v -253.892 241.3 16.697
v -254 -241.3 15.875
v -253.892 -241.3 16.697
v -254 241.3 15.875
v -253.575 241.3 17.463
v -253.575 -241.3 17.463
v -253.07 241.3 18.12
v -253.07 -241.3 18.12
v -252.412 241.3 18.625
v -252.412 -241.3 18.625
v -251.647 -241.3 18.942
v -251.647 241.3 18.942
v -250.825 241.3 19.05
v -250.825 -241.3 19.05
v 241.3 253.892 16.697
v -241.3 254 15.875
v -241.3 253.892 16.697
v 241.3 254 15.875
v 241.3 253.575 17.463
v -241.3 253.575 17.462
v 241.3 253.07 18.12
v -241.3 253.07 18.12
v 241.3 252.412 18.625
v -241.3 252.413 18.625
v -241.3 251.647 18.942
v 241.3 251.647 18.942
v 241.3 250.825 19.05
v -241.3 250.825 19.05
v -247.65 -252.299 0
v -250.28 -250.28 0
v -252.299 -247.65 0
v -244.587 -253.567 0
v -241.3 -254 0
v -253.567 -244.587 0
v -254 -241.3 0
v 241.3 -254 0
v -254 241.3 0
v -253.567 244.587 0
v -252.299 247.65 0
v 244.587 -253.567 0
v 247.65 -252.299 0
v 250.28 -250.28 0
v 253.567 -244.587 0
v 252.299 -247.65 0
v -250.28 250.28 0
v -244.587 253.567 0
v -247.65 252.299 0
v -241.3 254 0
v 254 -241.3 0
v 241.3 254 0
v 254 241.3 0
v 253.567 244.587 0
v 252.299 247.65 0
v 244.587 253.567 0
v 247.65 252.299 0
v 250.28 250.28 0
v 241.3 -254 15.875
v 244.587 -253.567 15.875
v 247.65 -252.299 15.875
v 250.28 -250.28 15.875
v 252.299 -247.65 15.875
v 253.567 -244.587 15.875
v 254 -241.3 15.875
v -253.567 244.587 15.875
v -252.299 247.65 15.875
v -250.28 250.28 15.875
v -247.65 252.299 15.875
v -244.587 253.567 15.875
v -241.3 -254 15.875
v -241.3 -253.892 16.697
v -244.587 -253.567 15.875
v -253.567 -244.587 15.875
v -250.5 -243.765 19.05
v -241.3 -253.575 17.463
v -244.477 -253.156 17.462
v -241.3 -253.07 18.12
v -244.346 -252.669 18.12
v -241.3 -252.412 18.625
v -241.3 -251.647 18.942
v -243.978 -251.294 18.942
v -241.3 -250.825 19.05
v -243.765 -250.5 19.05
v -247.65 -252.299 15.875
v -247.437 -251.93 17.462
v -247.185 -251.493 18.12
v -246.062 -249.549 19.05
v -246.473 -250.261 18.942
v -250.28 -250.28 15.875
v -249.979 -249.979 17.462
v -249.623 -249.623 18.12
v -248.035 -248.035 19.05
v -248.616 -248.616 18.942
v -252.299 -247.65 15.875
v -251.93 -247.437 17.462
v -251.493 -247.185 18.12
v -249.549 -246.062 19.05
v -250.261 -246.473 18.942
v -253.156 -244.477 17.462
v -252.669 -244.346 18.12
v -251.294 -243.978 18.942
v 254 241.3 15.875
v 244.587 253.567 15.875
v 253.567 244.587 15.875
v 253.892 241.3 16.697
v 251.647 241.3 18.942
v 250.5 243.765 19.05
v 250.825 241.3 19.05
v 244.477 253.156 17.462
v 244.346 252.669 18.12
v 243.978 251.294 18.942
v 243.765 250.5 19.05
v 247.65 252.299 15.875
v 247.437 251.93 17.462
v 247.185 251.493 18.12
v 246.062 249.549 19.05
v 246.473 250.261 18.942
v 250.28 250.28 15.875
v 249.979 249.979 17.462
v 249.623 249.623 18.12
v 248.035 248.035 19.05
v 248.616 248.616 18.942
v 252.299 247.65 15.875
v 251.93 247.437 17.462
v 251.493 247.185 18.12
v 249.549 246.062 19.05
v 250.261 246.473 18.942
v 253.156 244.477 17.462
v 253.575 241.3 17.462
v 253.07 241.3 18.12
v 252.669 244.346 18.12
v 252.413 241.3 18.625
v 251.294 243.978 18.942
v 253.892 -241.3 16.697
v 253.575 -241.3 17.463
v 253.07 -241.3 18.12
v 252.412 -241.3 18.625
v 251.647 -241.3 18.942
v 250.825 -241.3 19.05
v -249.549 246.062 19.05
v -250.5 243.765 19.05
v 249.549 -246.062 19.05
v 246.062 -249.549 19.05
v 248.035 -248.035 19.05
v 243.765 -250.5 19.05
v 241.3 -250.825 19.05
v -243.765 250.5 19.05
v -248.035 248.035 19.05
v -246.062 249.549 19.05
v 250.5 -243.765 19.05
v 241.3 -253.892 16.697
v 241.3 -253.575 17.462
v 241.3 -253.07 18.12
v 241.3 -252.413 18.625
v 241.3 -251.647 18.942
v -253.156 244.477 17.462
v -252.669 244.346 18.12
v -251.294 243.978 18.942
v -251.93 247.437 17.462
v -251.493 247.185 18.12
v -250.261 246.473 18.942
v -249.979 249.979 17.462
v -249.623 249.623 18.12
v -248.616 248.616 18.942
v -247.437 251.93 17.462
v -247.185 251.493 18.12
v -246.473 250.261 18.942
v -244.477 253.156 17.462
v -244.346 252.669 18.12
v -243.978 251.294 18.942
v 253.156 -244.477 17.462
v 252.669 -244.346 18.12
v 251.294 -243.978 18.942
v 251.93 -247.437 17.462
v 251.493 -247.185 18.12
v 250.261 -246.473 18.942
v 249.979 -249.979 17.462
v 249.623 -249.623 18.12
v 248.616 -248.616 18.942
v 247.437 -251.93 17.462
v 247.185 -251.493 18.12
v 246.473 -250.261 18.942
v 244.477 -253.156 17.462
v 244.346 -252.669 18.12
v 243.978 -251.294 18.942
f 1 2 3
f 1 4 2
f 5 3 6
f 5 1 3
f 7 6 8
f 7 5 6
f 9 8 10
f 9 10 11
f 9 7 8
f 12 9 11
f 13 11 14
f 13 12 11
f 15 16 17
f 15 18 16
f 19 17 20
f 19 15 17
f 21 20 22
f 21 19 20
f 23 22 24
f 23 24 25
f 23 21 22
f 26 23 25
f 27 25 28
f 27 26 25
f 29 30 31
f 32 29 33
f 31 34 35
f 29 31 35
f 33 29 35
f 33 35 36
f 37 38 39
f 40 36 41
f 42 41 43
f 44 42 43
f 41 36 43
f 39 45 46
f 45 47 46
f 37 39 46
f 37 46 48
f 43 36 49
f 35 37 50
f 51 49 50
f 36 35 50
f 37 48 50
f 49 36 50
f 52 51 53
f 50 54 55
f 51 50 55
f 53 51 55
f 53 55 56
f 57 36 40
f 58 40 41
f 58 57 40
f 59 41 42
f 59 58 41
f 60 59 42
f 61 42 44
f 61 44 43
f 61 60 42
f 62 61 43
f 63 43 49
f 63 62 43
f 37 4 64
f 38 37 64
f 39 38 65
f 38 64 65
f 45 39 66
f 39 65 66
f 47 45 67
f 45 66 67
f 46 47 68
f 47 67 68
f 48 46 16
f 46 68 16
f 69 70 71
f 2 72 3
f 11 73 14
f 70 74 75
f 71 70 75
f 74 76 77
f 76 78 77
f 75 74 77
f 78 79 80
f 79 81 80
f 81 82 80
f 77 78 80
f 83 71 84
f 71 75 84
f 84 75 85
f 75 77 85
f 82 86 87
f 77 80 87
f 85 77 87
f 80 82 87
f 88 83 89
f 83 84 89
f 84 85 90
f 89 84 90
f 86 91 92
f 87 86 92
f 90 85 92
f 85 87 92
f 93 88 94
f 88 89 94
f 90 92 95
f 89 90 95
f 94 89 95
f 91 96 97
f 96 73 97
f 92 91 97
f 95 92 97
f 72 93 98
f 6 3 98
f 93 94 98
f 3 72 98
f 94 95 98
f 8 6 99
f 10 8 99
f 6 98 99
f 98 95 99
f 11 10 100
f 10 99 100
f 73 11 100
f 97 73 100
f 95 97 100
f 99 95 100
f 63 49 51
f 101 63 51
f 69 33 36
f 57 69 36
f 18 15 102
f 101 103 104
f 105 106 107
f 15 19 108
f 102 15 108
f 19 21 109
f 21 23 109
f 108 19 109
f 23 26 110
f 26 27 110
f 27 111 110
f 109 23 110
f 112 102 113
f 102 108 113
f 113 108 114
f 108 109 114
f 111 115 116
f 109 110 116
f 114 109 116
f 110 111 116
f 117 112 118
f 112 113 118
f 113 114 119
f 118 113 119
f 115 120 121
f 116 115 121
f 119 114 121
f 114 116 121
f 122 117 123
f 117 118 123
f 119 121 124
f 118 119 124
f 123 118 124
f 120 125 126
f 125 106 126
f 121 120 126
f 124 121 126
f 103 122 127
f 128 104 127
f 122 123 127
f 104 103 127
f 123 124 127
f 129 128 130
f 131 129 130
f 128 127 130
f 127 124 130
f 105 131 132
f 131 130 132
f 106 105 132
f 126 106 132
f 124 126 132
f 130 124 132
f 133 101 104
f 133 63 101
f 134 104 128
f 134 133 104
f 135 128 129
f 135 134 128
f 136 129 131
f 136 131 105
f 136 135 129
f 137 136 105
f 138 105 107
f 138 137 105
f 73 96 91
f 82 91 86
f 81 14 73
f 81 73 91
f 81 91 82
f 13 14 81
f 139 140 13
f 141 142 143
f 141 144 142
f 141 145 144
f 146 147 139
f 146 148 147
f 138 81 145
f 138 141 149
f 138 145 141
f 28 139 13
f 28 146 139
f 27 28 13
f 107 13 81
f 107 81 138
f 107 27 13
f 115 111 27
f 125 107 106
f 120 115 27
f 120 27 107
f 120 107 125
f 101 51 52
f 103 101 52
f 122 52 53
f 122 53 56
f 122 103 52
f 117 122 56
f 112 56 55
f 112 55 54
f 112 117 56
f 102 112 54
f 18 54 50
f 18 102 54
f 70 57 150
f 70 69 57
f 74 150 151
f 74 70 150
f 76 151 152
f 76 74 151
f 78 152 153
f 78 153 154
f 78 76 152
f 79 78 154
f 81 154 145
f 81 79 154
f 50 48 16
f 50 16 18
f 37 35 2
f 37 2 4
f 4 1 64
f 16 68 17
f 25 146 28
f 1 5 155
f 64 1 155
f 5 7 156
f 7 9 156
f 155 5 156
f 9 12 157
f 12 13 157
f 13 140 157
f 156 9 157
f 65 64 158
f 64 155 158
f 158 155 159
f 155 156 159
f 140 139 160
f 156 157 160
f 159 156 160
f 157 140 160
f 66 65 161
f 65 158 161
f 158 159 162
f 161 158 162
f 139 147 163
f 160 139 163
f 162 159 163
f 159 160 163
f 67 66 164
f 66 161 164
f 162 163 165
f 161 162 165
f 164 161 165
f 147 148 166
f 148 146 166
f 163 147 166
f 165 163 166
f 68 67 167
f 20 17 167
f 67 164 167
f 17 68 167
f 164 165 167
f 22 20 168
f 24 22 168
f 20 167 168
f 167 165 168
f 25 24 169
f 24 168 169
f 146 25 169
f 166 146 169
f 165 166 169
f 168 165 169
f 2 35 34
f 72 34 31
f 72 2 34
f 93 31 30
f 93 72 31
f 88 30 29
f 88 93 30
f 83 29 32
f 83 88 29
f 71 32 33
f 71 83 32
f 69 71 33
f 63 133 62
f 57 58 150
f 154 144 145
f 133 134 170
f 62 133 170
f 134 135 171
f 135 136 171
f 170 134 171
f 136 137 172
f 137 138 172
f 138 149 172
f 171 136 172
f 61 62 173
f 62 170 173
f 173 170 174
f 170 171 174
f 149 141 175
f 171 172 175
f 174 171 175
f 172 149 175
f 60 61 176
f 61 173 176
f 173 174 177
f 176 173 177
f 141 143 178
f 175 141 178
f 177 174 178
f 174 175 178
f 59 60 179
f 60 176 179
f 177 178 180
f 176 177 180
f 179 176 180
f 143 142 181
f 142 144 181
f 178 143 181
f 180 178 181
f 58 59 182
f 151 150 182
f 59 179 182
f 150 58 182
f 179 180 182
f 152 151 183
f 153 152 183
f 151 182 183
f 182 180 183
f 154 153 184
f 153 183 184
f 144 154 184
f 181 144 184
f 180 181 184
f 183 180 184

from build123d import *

# Parameters (mm, degrees)
F0_W     = 508
F0_H     = 508
F1_DEPTH = 19.05
F2_R     = 12.7
F3_R     = 3.175


with BuildPart() as f1:
    # F0 (on Top) → F1 (new body)
    with BuildSketch(Plane.XY):
        Rectangle(F0_W, F0_H)
    extrude(amount=F1_DEPTH)

    # F2
    f2_edges = [f1.edges().sort_by_distance(p)[0] for p in [
        (-254, 254, 9.525),
        (254, 254, 9.525),
        (-254, -254, 9.525),
        (254, -254, 9.525),
    ]]
    fillet(f2_edges, radius=F2_R)

    # F3
    f3_edges = [f1.edges().sort_by_distance(p)[0] for p in [
        (-254, 0, 19.05),
    ]]
    fillet(f3_edges, radius=F3_R)


solid = f1.part
